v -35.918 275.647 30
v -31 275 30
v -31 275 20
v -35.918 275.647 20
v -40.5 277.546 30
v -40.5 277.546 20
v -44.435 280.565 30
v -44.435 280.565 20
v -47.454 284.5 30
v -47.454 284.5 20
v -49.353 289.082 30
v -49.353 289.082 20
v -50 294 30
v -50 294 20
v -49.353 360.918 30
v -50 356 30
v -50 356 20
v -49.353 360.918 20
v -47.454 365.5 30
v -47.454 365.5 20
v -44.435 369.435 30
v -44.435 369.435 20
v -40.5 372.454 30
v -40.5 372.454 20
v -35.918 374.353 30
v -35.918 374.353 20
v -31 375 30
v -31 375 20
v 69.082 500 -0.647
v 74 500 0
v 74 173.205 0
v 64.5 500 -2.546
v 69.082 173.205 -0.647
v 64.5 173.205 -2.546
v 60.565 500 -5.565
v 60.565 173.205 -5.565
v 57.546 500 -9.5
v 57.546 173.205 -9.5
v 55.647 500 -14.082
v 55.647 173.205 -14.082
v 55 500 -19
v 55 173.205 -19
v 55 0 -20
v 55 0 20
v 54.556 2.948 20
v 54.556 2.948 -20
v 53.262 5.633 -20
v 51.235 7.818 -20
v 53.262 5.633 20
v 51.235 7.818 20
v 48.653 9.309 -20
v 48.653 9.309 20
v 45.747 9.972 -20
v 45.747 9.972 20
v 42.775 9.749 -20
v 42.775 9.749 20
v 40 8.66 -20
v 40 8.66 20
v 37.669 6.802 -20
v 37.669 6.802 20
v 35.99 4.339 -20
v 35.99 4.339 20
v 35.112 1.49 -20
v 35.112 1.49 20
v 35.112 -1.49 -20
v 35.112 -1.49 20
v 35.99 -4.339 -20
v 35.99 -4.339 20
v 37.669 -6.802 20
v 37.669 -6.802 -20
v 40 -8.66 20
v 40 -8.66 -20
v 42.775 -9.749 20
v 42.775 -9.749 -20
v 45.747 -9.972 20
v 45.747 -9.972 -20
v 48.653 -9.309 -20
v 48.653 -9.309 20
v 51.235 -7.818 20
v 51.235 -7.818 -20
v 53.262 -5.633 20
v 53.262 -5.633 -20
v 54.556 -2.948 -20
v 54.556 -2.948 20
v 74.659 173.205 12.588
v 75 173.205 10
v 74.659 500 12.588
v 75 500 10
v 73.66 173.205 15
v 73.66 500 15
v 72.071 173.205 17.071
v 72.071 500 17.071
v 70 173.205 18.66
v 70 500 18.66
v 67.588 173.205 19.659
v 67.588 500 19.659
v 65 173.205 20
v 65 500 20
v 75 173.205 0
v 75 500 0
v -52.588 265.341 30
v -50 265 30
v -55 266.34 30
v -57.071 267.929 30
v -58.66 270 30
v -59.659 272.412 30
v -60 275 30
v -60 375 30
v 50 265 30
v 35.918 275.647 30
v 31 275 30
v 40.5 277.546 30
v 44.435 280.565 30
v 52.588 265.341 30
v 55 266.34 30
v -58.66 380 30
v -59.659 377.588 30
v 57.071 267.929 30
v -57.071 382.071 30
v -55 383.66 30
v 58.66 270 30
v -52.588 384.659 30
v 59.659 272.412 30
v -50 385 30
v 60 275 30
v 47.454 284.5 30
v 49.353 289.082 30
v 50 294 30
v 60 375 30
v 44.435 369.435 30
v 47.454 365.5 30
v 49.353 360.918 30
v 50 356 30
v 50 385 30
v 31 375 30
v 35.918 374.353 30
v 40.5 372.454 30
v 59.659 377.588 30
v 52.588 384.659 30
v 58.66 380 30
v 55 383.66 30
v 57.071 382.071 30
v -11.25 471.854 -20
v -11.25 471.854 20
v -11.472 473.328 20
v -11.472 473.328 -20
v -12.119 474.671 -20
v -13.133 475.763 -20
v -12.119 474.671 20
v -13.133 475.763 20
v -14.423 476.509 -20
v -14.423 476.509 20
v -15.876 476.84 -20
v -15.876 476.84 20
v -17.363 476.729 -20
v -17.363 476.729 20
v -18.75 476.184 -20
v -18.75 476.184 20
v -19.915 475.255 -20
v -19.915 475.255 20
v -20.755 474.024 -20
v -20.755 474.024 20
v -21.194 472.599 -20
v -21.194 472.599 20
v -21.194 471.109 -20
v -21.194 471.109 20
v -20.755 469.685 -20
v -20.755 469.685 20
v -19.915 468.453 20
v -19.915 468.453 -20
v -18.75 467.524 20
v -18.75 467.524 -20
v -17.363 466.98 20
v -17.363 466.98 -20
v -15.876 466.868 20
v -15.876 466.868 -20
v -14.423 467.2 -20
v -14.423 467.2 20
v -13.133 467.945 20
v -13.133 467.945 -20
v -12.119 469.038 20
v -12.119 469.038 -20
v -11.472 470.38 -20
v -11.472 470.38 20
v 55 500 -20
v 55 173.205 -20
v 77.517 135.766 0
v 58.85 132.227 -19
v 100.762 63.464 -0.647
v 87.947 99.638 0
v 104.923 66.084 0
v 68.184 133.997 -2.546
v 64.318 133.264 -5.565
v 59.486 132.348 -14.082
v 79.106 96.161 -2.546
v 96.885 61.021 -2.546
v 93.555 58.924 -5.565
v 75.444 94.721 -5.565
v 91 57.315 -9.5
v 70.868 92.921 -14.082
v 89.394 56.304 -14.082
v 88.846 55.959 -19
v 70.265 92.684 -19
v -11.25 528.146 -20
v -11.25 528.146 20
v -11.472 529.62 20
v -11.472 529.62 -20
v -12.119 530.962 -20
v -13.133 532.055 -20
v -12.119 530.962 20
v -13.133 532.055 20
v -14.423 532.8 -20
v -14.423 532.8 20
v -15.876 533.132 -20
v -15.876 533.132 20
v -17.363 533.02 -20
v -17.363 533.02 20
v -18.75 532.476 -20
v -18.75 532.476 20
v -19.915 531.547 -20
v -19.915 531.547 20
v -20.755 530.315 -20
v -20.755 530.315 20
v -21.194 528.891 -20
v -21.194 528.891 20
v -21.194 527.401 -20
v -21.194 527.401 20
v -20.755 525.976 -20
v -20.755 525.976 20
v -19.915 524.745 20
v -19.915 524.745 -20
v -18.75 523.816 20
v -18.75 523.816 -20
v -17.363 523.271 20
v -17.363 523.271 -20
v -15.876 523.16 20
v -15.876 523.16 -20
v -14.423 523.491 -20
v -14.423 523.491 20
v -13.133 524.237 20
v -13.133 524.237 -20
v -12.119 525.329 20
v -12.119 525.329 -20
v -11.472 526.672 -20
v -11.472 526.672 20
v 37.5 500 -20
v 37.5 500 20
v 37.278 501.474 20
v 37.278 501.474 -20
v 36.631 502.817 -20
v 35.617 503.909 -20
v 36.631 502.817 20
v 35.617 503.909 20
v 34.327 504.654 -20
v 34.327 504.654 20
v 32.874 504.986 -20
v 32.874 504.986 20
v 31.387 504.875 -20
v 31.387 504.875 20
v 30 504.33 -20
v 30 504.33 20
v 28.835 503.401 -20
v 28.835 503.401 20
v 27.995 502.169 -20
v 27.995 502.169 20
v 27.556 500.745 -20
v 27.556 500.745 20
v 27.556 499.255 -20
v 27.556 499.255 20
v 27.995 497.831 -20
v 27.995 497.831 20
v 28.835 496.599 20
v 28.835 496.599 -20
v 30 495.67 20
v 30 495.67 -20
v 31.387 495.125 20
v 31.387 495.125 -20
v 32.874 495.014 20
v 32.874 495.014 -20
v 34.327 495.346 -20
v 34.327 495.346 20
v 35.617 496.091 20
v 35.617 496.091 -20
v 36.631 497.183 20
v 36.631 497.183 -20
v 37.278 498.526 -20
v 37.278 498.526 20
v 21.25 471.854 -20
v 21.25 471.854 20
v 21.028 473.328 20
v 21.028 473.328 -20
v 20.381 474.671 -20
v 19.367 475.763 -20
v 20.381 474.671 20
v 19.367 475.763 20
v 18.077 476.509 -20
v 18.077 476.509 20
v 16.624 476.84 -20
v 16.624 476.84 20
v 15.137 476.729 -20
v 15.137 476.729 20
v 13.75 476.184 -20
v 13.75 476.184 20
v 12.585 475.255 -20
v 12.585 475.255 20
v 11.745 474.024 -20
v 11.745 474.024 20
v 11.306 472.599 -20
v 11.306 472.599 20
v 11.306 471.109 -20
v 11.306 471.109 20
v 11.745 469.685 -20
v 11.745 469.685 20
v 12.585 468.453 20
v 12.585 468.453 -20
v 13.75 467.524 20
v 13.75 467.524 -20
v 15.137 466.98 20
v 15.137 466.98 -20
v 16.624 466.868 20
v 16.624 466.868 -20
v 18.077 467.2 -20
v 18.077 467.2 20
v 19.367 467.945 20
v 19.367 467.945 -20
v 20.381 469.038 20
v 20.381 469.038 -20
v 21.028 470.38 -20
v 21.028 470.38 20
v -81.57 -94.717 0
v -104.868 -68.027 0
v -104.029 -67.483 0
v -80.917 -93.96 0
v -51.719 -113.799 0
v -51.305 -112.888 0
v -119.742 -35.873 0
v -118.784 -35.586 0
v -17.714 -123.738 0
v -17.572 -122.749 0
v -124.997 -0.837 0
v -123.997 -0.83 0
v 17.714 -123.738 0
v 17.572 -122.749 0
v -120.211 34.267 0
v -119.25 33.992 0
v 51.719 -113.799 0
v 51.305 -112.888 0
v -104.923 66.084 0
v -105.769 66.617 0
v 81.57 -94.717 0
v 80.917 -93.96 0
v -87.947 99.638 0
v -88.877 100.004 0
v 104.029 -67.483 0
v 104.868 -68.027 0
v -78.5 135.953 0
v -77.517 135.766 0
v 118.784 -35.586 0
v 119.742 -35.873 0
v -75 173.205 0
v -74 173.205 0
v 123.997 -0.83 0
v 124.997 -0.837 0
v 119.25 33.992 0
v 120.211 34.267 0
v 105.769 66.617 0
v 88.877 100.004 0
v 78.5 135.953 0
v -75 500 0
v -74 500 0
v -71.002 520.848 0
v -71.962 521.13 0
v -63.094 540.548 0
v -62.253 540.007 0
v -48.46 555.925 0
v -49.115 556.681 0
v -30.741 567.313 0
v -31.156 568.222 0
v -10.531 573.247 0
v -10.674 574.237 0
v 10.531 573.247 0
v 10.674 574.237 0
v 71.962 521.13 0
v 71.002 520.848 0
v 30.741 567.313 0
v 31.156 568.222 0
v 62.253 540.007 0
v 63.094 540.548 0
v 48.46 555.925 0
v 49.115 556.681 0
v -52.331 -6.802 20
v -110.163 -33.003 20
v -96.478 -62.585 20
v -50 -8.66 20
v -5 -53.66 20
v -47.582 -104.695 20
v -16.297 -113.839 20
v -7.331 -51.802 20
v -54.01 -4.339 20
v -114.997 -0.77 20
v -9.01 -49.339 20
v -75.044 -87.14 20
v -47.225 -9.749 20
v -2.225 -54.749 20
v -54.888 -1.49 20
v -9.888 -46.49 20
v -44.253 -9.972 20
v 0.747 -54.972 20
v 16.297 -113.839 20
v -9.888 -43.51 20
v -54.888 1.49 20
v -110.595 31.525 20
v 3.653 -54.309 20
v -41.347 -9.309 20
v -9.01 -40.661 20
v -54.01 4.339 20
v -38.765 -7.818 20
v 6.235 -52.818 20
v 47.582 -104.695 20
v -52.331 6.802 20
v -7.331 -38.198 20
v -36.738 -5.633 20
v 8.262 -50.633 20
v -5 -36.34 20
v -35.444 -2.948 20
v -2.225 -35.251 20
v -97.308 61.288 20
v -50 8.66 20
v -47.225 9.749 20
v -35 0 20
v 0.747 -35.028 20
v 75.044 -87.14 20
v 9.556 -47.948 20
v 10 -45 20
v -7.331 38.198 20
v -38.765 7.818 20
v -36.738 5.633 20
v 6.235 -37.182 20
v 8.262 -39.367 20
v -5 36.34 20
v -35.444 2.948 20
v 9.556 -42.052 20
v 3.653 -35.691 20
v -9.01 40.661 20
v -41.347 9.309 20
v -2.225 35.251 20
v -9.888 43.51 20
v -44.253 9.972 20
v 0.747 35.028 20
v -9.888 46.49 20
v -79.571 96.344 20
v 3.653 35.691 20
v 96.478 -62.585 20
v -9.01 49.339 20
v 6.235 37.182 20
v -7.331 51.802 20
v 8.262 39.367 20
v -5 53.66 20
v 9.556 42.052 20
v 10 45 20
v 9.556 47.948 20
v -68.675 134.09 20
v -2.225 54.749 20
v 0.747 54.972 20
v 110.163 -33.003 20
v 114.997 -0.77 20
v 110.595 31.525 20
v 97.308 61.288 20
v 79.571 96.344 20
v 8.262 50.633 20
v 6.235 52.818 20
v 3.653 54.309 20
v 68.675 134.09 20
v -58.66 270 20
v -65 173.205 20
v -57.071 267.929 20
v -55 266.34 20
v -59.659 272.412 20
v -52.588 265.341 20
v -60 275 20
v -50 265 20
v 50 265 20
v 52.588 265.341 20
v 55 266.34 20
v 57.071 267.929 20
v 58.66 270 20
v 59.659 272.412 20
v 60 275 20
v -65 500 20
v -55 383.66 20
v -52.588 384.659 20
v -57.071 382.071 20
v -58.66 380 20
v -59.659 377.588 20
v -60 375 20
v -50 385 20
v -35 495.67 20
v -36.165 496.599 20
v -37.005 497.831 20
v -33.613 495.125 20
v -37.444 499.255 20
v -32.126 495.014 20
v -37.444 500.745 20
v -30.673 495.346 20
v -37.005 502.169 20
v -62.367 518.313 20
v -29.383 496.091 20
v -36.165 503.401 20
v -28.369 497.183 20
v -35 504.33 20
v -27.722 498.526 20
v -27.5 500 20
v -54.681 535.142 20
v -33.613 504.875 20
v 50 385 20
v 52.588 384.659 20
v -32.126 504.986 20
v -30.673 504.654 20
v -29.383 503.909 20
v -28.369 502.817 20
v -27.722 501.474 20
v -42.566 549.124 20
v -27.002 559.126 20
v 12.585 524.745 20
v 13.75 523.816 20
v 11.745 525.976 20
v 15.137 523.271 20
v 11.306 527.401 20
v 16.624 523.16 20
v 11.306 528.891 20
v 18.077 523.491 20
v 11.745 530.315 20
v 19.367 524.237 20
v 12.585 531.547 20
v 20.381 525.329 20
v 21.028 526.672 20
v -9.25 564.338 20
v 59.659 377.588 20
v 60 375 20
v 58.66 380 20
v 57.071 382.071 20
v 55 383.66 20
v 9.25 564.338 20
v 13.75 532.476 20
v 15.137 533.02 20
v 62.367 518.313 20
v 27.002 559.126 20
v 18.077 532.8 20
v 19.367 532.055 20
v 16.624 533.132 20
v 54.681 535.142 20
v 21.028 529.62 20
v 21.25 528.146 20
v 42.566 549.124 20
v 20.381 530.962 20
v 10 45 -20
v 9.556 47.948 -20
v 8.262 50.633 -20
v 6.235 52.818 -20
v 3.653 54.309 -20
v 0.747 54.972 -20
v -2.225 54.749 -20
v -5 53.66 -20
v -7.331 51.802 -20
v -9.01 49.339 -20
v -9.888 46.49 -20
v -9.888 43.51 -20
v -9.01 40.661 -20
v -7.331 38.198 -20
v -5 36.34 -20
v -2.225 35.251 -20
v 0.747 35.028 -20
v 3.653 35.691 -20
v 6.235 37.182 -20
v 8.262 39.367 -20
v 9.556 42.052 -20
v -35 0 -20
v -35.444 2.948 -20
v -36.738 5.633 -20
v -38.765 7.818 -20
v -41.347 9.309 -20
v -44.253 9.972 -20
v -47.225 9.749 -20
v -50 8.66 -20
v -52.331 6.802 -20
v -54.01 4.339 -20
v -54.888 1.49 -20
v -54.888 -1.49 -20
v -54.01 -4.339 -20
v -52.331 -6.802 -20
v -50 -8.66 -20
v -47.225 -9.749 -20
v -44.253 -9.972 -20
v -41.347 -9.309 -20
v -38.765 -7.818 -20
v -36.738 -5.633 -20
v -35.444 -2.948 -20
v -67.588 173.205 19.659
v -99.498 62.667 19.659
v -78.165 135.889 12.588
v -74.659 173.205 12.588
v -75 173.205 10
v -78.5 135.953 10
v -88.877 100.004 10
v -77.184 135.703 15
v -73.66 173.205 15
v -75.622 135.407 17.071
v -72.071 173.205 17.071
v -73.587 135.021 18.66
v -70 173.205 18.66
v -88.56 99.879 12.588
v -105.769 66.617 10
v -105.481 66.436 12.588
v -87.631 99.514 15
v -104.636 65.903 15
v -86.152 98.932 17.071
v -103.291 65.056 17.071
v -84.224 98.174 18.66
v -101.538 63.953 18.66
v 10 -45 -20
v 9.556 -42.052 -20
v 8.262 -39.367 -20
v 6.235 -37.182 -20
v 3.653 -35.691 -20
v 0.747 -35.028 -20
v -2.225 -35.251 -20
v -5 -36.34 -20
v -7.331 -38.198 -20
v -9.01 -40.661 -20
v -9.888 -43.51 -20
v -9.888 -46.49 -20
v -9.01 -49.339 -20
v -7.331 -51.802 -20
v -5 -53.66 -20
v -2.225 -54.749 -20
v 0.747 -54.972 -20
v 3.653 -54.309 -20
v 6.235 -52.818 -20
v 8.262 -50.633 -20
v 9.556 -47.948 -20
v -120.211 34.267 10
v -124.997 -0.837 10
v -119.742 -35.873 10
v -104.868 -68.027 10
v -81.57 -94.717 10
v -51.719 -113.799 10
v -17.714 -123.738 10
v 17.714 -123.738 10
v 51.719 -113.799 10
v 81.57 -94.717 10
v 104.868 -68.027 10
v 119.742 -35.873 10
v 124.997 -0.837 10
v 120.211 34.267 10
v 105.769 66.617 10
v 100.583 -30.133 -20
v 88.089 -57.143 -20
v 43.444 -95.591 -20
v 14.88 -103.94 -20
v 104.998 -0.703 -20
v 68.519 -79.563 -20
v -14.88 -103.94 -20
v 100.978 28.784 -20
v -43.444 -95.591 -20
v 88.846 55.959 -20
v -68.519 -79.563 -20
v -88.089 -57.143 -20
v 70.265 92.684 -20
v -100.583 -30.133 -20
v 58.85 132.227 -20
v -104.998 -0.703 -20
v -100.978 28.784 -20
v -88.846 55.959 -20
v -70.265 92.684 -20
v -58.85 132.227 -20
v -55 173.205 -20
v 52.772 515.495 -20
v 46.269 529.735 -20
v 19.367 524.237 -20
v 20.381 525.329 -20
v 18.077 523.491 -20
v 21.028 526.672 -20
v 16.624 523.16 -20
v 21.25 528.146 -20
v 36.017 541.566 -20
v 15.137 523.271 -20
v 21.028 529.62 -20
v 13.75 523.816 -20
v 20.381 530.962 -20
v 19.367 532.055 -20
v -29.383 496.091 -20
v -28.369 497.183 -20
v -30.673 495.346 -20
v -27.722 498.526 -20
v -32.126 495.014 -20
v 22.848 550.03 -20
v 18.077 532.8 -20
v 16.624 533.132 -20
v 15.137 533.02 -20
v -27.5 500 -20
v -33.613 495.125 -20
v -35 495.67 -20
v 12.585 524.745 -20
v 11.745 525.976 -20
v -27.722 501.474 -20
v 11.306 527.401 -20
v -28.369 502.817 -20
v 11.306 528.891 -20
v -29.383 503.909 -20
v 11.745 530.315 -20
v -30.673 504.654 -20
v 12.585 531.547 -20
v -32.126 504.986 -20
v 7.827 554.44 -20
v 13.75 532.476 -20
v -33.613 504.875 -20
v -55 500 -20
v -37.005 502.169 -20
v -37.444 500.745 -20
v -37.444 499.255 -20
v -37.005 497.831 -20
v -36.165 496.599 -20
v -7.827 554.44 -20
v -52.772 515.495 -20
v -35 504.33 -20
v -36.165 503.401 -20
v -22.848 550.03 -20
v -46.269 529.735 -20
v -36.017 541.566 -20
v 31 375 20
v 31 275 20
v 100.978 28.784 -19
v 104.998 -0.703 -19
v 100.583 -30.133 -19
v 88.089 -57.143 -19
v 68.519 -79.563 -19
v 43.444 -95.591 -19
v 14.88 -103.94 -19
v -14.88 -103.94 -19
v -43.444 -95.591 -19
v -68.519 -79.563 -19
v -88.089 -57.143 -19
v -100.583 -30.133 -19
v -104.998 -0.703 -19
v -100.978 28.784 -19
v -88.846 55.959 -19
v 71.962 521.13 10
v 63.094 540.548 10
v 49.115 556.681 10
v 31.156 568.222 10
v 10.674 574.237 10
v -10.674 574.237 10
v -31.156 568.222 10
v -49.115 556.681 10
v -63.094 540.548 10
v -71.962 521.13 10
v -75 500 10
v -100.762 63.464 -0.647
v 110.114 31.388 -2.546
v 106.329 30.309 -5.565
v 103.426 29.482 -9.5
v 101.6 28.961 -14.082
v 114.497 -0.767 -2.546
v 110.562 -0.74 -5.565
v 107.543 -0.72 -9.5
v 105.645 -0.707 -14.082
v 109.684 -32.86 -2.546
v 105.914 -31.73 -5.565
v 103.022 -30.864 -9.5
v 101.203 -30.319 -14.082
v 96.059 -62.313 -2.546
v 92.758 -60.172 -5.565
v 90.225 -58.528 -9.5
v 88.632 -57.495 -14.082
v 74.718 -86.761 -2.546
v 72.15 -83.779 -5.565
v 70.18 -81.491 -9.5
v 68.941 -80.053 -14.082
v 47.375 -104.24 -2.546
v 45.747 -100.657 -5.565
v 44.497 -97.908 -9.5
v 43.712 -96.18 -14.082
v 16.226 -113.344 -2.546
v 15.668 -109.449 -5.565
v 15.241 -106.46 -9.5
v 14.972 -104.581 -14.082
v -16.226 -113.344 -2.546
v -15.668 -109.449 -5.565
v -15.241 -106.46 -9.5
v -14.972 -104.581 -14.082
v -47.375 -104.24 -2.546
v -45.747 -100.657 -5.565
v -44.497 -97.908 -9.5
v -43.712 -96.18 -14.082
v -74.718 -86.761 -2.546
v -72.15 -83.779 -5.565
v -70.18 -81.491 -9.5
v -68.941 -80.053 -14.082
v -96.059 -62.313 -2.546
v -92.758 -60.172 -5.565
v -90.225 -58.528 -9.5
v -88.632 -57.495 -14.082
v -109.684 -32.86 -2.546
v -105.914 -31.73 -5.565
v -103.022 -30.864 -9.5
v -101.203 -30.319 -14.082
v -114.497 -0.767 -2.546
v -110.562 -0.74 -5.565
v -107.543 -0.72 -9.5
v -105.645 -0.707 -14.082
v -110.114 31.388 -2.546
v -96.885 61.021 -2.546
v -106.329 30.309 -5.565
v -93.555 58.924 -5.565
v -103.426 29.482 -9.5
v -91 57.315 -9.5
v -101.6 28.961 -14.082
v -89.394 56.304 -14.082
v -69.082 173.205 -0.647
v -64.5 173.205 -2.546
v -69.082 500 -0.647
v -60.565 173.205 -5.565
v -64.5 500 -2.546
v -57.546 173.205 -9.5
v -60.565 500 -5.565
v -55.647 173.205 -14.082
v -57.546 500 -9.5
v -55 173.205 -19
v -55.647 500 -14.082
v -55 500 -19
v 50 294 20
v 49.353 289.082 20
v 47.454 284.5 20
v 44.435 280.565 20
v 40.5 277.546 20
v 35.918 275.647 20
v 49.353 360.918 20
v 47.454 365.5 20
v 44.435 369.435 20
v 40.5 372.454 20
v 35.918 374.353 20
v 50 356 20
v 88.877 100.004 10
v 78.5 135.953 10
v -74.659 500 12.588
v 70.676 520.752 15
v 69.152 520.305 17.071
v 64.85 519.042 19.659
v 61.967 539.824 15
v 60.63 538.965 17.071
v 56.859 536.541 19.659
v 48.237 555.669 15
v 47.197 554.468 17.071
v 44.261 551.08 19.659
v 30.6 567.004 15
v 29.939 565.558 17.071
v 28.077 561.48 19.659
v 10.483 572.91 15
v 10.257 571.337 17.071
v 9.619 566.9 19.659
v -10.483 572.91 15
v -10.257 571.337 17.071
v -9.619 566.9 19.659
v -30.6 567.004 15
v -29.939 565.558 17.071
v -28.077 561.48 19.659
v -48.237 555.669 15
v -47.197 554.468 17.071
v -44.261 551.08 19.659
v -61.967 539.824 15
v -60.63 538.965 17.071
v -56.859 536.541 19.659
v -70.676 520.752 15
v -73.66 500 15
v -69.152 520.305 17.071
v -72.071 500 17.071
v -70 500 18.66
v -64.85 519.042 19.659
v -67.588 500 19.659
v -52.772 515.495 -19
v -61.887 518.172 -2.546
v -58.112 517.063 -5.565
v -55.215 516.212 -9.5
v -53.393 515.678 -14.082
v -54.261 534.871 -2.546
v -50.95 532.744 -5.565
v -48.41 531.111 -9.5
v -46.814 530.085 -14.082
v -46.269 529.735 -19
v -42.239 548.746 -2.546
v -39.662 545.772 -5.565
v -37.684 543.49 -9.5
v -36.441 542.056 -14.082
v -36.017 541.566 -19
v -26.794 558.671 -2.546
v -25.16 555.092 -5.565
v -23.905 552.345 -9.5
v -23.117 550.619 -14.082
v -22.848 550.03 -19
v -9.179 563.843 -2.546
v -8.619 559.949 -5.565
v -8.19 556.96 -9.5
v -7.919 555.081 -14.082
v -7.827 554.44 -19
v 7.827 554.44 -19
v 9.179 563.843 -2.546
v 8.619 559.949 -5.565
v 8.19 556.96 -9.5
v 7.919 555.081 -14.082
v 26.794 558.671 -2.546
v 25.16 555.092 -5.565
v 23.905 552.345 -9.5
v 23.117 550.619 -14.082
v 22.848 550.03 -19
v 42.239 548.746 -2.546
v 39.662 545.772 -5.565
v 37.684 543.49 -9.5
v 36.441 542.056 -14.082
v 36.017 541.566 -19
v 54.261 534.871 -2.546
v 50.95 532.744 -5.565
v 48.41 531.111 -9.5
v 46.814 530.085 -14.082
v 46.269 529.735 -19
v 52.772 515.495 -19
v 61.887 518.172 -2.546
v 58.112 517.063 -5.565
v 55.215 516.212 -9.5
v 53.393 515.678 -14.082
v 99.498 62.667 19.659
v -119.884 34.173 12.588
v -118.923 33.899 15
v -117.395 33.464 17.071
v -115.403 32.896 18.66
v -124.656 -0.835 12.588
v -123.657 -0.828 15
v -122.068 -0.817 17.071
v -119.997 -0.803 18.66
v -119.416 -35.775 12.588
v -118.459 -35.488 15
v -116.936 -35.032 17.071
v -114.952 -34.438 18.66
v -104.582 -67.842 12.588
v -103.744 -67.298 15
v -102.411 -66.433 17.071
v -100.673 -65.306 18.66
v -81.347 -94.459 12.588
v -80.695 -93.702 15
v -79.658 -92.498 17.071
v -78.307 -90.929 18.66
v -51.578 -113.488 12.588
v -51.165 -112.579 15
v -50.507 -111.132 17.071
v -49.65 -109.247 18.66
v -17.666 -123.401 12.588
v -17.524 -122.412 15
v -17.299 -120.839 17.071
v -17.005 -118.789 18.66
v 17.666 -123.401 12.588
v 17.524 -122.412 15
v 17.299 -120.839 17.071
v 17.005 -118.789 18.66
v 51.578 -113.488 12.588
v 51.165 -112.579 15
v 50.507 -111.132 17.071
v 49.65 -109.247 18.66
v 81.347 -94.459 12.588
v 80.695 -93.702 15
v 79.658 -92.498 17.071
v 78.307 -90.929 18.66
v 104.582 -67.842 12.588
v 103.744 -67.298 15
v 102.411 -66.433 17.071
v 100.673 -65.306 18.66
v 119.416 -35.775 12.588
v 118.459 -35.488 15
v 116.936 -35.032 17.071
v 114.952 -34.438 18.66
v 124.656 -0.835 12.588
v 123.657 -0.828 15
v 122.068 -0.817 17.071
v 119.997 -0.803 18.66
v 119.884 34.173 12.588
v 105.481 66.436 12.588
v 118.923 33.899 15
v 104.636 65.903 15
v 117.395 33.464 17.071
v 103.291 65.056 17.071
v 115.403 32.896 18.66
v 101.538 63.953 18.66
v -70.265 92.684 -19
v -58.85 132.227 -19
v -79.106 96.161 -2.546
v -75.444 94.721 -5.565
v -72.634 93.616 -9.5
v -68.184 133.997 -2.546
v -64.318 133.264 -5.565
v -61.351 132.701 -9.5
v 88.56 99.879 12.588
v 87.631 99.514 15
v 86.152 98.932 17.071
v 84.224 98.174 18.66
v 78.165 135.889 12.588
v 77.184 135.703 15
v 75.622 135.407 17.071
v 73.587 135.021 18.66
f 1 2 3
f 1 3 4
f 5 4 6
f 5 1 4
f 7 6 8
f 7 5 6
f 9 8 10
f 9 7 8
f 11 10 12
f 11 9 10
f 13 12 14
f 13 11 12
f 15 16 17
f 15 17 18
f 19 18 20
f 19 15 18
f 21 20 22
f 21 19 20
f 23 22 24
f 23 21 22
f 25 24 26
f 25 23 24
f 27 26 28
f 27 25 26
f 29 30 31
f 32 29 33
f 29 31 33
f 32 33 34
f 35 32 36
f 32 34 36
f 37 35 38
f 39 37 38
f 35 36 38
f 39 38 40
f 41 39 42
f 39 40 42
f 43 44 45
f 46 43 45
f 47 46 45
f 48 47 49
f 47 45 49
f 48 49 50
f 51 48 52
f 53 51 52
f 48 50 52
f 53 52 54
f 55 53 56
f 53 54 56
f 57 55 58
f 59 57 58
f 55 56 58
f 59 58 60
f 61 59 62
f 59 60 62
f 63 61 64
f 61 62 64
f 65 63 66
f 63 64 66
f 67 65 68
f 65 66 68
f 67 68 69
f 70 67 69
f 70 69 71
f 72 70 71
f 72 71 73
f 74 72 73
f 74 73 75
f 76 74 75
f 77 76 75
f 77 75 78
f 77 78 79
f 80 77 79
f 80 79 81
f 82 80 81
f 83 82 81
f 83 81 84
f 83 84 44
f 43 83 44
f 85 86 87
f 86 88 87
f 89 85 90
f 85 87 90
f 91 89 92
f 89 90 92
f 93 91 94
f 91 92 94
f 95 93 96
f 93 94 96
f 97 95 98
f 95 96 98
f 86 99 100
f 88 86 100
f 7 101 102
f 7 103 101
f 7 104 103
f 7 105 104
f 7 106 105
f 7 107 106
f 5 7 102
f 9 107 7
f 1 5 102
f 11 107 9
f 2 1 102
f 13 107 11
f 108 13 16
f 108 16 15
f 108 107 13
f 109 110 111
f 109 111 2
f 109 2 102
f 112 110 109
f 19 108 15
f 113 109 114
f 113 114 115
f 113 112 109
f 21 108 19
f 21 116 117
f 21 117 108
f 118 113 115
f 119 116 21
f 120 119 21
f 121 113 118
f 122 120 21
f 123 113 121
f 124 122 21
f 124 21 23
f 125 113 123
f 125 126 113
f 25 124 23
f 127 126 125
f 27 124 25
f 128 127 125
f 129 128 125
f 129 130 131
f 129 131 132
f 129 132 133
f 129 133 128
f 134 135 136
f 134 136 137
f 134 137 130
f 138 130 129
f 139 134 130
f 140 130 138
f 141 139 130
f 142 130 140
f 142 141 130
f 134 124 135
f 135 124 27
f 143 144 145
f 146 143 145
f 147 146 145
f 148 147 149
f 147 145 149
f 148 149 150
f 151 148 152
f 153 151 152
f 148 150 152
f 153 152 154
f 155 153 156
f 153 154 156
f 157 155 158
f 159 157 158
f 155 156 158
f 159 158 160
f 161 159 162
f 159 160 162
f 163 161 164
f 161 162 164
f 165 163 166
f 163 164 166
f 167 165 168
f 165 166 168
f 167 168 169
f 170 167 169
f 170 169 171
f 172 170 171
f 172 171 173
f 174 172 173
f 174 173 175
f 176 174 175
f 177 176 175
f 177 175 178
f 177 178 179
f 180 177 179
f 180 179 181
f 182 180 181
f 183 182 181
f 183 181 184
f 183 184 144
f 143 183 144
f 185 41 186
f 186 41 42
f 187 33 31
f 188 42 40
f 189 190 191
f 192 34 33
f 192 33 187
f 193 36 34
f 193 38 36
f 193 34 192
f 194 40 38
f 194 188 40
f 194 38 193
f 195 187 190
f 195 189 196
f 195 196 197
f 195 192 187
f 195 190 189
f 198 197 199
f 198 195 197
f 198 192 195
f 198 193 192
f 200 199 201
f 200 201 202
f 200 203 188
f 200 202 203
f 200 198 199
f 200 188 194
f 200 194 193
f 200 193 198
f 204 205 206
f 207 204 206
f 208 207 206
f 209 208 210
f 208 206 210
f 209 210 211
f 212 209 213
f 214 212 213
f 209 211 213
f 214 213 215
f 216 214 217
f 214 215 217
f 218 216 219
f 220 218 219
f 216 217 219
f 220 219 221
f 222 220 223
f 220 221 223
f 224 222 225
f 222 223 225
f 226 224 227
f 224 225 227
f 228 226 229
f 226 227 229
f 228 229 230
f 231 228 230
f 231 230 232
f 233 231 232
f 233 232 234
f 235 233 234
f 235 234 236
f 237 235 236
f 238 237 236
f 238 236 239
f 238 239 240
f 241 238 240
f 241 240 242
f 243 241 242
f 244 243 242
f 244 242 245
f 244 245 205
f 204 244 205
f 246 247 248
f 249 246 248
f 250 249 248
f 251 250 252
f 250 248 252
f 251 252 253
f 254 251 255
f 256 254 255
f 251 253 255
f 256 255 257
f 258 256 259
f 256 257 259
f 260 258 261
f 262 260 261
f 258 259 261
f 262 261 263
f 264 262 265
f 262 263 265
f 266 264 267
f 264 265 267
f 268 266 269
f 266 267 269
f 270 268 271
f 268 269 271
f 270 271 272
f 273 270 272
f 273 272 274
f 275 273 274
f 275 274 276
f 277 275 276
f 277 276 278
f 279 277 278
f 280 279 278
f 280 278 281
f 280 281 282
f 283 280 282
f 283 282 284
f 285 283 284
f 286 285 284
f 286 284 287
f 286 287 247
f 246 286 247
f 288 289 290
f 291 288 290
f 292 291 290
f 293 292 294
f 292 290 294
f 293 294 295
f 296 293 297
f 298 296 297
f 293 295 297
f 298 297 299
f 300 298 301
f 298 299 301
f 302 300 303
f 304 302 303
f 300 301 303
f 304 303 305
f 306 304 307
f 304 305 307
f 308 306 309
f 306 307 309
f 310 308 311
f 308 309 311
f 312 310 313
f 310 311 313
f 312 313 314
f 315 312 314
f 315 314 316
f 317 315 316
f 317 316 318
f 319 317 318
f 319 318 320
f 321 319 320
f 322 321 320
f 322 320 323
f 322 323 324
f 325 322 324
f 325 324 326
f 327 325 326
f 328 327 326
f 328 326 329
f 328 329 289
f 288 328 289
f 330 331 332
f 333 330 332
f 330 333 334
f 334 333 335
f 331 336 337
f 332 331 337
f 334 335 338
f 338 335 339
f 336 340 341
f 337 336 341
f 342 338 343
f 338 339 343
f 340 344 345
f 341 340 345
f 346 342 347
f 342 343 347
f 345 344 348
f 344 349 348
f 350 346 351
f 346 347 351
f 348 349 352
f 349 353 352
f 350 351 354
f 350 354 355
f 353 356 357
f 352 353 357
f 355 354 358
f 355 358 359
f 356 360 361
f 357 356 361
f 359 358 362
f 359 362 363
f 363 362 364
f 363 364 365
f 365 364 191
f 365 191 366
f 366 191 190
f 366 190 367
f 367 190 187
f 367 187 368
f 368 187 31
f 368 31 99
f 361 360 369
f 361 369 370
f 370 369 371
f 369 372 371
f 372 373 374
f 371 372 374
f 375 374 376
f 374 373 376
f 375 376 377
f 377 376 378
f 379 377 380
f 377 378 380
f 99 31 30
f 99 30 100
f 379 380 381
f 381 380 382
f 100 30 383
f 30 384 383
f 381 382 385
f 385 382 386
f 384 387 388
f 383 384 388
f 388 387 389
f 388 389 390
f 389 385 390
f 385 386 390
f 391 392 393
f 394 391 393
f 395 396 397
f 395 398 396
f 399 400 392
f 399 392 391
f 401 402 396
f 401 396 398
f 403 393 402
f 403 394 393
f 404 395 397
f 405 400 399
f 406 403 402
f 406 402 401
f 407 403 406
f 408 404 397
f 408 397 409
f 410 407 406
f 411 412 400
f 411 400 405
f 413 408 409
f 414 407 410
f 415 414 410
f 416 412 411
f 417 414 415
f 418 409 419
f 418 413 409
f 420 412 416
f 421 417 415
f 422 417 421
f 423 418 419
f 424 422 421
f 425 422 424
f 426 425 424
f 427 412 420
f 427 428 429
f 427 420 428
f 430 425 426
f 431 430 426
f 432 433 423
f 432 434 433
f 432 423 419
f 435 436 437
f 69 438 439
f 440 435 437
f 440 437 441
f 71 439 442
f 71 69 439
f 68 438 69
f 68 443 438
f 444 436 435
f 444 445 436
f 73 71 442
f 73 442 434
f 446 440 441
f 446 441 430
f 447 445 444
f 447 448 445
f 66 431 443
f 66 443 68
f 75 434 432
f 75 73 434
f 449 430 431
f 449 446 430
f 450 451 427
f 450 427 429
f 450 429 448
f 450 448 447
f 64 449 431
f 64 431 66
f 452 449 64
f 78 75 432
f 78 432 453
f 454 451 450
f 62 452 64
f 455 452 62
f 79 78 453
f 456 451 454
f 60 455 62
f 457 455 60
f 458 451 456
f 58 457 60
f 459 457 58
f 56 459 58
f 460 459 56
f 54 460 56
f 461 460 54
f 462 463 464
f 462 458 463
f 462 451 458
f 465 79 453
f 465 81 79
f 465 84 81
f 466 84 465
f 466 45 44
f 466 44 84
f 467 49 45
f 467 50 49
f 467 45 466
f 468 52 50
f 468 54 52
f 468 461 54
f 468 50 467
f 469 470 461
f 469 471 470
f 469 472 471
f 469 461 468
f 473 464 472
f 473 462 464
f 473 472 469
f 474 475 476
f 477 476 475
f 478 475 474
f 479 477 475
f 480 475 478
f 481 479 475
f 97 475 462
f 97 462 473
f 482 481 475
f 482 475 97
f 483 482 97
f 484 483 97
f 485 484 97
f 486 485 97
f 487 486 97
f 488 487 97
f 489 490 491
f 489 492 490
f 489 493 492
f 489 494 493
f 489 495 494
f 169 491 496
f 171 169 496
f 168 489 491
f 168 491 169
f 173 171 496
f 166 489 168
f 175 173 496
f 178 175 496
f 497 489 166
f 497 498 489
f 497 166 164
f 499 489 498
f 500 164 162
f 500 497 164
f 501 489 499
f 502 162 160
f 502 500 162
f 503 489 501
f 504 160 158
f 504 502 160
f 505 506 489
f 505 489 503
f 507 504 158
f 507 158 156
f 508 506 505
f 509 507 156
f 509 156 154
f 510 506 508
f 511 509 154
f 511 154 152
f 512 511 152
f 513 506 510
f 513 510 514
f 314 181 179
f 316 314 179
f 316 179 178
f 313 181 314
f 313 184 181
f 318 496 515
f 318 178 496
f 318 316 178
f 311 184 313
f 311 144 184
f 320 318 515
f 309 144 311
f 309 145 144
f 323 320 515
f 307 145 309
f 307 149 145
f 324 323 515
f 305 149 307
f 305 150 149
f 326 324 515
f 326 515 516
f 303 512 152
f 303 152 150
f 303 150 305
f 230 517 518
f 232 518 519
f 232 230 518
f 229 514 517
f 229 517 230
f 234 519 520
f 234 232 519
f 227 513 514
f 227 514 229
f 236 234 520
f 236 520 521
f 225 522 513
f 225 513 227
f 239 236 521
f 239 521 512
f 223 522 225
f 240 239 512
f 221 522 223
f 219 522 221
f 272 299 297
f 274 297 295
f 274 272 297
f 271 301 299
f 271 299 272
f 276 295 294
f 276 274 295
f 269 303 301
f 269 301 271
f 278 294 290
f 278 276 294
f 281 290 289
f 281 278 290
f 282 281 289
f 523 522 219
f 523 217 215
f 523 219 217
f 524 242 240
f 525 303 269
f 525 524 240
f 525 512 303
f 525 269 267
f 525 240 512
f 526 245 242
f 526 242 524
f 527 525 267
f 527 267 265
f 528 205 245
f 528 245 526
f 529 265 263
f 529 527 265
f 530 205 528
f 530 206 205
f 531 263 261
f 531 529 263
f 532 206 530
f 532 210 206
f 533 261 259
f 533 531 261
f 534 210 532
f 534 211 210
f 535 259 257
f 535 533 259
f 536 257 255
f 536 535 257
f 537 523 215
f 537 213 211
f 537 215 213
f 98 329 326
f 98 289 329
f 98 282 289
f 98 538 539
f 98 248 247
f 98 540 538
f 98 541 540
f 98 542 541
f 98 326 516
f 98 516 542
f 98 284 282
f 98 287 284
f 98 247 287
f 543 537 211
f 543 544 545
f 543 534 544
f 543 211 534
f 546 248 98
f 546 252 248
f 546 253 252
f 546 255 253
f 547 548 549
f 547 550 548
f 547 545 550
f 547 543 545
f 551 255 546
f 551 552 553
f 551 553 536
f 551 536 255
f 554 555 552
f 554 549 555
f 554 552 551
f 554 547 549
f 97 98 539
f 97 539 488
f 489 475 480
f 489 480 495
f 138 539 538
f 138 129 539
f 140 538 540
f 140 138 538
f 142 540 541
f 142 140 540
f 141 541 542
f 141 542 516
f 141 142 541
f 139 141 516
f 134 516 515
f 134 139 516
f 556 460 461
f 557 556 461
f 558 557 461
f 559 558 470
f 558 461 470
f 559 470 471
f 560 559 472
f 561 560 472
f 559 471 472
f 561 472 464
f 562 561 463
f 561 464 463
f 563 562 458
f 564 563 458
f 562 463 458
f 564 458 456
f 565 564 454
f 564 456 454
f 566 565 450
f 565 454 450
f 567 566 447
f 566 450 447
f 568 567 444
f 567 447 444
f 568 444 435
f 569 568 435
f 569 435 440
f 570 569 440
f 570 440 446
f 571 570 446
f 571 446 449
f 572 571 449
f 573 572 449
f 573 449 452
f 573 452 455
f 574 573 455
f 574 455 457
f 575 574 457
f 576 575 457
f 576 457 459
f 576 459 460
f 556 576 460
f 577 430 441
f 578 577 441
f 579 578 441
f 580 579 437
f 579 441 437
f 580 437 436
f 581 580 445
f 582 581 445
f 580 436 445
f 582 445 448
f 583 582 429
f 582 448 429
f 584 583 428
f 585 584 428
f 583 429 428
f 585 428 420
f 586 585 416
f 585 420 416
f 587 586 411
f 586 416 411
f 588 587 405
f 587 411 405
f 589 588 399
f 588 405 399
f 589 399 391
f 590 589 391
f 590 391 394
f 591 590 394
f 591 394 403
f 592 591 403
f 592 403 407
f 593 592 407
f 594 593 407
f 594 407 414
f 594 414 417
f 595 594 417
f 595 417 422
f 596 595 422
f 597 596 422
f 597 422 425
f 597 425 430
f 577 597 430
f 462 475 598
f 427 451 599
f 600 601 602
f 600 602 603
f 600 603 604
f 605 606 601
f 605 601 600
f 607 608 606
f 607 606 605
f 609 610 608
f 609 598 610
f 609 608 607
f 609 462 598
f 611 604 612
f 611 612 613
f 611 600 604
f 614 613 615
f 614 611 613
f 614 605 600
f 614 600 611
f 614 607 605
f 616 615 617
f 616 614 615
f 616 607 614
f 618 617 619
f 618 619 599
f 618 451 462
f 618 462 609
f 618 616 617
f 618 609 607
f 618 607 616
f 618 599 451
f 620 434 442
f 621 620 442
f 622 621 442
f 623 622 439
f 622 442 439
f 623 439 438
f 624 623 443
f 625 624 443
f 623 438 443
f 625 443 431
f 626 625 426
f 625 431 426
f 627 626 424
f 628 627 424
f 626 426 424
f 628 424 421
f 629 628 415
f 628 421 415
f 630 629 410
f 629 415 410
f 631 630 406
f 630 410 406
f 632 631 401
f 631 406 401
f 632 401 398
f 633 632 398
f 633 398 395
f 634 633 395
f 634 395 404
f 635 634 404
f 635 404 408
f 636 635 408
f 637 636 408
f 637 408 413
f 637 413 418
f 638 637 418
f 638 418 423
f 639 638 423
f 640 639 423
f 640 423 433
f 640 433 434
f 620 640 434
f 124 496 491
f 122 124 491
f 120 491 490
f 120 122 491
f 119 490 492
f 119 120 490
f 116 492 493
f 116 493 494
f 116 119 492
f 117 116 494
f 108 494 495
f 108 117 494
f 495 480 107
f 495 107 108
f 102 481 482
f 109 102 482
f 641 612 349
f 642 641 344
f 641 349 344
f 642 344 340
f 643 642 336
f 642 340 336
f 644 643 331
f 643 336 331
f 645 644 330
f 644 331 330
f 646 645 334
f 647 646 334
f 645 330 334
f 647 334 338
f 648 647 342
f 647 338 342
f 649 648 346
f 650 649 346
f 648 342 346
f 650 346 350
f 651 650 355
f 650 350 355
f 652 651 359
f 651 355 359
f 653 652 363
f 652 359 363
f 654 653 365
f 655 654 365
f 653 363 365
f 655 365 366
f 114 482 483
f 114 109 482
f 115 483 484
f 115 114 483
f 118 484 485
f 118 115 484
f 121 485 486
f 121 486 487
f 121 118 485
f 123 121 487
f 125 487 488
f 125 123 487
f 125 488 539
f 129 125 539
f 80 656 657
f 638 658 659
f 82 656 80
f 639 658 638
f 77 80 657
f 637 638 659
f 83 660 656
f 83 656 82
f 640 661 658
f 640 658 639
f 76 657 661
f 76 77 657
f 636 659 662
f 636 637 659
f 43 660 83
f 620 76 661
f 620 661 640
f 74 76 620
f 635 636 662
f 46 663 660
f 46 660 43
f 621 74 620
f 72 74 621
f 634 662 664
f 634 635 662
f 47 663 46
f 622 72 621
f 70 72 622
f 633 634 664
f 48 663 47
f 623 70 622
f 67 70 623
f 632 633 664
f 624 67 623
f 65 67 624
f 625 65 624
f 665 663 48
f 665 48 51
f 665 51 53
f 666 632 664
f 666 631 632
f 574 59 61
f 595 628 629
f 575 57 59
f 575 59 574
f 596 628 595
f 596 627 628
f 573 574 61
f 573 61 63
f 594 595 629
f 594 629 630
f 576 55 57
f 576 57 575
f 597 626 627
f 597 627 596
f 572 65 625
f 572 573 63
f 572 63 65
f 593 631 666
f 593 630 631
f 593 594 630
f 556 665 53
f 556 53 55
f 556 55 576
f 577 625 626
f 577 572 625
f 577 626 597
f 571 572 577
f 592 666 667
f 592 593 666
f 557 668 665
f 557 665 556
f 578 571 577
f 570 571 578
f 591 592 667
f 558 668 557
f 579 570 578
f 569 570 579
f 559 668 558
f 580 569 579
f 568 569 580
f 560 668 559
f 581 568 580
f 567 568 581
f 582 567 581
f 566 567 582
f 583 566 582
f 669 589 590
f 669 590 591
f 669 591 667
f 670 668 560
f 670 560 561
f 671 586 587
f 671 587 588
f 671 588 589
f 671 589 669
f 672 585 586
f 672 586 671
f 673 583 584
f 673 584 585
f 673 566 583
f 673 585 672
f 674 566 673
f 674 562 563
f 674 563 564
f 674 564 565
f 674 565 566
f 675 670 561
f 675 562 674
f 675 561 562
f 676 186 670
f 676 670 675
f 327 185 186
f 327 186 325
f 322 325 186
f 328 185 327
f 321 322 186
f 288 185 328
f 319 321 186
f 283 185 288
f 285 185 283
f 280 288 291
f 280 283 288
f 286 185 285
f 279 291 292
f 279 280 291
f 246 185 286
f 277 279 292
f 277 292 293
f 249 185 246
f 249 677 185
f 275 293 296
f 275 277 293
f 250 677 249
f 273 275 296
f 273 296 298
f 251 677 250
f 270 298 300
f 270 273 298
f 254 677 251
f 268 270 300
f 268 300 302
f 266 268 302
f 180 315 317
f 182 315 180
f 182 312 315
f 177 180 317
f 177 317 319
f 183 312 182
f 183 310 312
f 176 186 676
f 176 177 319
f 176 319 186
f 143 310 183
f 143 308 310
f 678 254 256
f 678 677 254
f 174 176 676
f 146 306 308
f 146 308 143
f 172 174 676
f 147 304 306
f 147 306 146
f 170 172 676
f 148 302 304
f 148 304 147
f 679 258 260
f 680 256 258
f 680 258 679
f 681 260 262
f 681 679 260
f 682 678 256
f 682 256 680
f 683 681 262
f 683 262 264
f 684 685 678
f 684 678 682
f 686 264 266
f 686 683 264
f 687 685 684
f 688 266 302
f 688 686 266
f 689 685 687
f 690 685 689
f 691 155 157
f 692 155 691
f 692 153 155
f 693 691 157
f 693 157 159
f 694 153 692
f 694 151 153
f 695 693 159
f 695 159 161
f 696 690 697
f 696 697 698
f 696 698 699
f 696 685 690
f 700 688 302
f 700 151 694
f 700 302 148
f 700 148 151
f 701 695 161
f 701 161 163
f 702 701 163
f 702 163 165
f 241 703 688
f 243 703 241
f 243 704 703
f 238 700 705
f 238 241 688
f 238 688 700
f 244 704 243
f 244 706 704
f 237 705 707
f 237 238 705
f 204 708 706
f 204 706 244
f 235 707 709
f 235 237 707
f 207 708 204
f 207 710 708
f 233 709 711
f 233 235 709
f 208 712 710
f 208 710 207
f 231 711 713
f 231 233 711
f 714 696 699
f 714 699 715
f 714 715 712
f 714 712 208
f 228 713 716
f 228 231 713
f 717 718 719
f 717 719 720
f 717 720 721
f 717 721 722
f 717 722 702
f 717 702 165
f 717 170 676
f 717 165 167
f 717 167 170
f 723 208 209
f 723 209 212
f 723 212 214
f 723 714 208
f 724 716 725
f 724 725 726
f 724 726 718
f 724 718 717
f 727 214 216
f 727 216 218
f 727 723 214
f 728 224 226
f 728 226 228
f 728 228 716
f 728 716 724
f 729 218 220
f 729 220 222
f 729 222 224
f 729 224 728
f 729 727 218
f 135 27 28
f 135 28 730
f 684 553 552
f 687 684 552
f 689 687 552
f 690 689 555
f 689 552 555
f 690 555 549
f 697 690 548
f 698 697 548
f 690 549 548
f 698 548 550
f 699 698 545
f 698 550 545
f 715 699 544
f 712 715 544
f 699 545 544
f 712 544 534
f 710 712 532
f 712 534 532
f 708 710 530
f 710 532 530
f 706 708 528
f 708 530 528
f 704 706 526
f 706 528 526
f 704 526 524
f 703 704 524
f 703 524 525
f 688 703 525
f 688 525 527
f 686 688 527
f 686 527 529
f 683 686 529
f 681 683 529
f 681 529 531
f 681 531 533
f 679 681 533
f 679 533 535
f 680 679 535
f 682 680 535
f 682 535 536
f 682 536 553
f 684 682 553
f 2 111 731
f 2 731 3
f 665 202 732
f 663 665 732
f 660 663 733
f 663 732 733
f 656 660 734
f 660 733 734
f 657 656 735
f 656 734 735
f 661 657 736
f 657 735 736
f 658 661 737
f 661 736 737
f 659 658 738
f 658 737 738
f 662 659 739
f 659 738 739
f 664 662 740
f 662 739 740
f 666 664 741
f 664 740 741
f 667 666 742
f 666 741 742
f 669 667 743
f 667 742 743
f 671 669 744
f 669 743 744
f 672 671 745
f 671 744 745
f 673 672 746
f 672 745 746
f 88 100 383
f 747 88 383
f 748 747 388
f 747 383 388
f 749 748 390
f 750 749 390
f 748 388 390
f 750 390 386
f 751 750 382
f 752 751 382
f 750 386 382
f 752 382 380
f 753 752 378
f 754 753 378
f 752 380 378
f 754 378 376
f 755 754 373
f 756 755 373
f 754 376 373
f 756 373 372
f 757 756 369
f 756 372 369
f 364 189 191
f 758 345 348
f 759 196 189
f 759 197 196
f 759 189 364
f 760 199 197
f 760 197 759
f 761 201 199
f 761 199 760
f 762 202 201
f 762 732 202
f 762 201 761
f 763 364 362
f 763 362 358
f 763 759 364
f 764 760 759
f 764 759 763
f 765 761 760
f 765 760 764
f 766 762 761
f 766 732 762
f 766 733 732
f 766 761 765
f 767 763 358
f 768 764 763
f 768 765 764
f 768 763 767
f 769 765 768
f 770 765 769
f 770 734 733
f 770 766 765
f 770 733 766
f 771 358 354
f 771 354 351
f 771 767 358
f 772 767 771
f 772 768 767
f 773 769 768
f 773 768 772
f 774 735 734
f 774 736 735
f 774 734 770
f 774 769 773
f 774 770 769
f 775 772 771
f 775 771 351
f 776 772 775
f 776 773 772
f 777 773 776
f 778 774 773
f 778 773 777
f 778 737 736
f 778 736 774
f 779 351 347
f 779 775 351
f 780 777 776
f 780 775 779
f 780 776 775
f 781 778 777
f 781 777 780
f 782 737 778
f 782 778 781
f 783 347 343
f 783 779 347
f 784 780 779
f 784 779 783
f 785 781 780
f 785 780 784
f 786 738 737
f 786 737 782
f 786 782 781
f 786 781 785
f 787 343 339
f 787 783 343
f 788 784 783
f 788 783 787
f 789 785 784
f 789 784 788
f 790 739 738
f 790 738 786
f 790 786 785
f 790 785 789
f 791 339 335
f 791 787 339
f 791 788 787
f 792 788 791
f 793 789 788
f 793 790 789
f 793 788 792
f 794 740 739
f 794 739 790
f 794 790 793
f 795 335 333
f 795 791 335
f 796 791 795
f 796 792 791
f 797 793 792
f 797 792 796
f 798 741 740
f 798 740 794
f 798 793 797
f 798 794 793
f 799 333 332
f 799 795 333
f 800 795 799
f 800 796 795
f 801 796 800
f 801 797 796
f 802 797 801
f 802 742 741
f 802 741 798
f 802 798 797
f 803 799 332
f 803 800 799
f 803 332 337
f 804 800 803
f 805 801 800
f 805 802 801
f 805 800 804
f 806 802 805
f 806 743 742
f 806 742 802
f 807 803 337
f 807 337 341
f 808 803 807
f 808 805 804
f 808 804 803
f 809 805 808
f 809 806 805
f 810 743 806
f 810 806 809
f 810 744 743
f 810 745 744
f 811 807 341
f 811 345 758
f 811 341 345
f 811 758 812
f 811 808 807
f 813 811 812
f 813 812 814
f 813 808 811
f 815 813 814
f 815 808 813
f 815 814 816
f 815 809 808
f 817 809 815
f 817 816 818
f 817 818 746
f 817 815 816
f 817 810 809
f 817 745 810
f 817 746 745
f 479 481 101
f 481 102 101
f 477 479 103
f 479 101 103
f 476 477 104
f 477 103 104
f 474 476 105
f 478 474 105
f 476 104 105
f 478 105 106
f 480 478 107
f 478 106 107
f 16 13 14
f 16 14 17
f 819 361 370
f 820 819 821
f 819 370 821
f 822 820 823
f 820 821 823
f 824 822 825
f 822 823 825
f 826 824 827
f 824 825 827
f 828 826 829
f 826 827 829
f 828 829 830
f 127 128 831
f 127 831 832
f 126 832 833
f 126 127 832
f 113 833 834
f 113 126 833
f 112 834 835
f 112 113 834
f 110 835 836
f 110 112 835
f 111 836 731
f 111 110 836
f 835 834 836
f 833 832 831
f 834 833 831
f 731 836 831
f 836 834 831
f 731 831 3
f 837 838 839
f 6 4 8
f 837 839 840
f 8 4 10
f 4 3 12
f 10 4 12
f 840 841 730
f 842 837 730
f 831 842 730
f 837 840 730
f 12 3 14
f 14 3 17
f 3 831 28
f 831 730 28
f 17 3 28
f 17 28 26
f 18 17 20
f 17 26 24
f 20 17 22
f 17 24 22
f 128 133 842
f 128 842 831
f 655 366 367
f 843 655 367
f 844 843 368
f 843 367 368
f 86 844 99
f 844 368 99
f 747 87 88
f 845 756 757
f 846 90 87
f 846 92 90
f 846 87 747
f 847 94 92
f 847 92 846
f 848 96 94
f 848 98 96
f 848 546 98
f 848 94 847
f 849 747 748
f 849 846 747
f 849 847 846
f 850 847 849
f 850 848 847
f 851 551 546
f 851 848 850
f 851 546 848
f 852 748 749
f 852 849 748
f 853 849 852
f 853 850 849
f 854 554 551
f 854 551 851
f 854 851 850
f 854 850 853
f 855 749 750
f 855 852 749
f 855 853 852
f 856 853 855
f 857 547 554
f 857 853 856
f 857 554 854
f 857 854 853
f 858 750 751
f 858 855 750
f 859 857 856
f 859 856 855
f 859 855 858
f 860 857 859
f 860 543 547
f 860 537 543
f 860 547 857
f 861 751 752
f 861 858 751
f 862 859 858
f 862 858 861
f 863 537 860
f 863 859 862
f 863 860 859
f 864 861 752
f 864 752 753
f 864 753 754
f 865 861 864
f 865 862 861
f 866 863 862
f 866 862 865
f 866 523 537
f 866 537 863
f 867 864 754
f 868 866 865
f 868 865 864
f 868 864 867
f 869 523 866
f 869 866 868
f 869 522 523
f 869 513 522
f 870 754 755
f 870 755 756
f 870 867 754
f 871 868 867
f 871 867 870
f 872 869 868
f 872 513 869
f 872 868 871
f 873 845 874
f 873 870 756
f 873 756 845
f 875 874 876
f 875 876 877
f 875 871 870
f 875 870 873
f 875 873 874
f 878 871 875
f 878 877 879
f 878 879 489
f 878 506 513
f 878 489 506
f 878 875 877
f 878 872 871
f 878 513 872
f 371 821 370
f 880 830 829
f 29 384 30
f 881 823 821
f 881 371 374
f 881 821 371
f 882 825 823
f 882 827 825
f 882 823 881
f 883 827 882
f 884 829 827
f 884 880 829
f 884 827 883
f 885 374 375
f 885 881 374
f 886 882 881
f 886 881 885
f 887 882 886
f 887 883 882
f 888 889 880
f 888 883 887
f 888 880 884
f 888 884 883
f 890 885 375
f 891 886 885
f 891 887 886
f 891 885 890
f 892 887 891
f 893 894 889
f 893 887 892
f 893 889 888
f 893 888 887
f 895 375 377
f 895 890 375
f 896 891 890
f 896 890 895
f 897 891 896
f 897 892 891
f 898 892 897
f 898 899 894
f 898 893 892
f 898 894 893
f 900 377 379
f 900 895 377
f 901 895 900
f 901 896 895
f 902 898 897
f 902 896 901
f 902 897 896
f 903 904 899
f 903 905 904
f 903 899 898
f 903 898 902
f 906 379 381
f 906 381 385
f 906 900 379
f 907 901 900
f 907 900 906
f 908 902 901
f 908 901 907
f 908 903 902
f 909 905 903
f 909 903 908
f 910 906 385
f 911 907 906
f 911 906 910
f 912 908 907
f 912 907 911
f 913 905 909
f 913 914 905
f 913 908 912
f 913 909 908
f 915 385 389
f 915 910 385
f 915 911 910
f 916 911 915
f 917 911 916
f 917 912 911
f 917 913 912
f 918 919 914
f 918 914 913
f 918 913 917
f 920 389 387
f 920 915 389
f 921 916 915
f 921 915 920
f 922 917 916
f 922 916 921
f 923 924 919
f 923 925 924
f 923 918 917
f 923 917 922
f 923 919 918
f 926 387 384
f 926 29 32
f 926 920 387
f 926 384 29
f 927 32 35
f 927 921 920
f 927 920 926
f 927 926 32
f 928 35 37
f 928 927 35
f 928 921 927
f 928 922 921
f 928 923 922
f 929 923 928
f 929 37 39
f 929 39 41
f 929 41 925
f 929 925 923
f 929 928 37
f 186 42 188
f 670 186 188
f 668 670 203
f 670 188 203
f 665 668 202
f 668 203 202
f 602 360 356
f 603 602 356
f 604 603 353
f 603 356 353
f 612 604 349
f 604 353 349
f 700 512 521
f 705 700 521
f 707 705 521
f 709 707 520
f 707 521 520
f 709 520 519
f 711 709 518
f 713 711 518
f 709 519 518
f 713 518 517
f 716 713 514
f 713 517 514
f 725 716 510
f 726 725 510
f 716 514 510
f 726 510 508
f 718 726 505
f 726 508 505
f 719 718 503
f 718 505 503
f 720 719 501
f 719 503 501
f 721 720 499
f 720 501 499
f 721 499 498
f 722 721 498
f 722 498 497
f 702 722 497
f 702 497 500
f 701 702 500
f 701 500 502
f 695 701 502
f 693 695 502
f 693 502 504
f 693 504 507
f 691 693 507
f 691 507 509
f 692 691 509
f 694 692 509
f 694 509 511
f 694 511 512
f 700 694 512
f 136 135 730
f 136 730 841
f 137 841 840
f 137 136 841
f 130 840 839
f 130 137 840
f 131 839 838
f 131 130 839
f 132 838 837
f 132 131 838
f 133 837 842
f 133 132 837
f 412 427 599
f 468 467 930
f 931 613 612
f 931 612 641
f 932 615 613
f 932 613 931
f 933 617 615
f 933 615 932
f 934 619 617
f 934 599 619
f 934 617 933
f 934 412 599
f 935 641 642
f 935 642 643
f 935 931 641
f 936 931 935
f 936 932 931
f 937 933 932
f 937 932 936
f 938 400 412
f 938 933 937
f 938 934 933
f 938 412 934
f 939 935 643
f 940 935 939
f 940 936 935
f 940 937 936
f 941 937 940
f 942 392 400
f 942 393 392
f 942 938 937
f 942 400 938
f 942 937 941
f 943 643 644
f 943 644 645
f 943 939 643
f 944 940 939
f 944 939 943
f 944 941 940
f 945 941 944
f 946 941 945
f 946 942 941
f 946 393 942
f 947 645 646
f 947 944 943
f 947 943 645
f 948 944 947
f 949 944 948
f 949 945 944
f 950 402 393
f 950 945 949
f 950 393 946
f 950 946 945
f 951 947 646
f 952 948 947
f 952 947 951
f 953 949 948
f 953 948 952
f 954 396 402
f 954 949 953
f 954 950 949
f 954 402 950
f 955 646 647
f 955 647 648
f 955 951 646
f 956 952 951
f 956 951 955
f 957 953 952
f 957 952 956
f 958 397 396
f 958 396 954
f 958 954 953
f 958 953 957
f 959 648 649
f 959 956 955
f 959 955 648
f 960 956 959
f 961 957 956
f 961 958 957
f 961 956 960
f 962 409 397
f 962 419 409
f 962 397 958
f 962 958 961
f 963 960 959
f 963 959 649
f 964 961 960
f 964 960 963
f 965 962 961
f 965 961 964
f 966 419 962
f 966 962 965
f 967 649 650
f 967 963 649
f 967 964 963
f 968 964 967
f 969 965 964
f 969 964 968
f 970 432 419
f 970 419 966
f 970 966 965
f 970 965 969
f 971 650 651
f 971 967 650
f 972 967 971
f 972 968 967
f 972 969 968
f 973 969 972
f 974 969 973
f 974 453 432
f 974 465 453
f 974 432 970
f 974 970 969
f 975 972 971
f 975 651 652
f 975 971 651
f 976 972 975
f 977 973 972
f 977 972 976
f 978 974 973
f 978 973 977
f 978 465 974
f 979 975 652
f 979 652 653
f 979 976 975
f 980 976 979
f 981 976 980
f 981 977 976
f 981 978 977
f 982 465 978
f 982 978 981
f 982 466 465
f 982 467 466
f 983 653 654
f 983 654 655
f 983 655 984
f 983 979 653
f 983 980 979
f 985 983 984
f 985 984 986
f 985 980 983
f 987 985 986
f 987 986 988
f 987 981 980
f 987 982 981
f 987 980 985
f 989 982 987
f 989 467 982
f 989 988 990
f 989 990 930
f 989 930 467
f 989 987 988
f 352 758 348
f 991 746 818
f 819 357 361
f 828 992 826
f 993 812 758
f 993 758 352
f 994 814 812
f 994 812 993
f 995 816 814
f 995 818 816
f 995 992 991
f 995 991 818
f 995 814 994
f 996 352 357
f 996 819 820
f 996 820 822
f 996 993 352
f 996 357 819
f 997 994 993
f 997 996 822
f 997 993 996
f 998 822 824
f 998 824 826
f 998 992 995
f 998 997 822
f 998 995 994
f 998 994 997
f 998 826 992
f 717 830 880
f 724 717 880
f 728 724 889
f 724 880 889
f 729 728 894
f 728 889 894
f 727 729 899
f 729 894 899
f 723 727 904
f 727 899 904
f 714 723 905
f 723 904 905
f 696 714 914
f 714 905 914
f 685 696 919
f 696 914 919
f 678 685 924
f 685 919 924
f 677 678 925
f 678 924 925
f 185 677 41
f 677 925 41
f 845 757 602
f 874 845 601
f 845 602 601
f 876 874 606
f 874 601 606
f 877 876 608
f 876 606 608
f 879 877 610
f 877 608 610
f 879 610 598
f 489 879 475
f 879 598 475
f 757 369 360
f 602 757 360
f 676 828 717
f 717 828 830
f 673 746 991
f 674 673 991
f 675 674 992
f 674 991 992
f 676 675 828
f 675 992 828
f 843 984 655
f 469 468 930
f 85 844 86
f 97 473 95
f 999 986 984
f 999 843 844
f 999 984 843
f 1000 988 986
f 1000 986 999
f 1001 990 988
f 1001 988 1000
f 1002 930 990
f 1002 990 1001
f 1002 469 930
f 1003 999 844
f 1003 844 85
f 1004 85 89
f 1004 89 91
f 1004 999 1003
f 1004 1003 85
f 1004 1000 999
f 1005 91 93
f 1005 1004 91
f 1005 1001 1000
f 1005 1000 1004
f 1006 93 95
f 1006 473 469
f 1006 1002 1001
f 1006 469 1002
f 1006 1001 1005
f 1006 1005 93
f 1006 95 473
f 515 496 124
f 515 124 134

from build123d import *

# Parameters (mm, degrees)
BOSS_EXTRUDE1_DEPTH = 20
BOSS_EXTRUDE2_DEPTH = 20
FILLET1_R           = 19
FILLET2_R           = 10
SKETCH3_R           = 5
SKETCH3_R_2         = 10
CUT_EXTRUDE1_DEPTH  = 590.788097561
SKETCH4_W           = 120
SKETCH4_H           = 120
BOSS_EXTRUDE3_DEPTH = 10
FILLET3_R           = 10
CUT_EXTRUDE2_DEPTH  = 10


with BuildPart() as part:
    # Sketch1 → Boss-Extrude1 (new body)
    with BuildSketch(Plane.XY):
        with BuildLine():
            Line((-75, 500), (-75, 173.205080757))
            ThreePointArc((-75, 173.205080757), (-82.846215434, 117.735061134), (-105.769230769, 66.617338753))
            ThreePointArc((-105.769230769, 66.617338753), (0, -125), (105.769230769, 66.617338753))
            ThreePointArc((105.769230769, 66.617338753), (82.846215434, 117.735061134), (75, 173.205080757))
            Line((75, 173.205080757), (75, 500))
            ThreePointArc((75, 500), (0, 575), (-75, 500))
        make_face()
    extrude(amount=BOSS_EXTRUDE1_DEPTH)

    # Sketch2 → Boss-Extrude2 (add)
    with BuildSketch(Plane(origin=(0, 0, 0), x_dir=(-1, 0, 0), z_dir=(0, 0, -1))):
        with BuildLine():
            Line((-55, 500), (-55, 173.205080757))
            ThreePointArc((-55, 173.205080757), (-63.630836977, 112.188059172), (-88.846153846, 55.958564552))
            ThreePointArc((-88.846153846, 55.958564552), (0, -105), (88.846153846, 55.958564552))
            ThreePointArc((88.846153846, 55.958564552), (63.630836977, 112.188059172), (55, 173.205080757))
            Line((55, 173.205080757), (55, 500))
            ThreePointArc((55, 500), (0, 555), (-55, 500))
        make_face()
    extrude(amount=BOSS_EXTRUDE2_DEPTH)

    # Fillet1
    fillet1_edges = [part.edges().sort_by_distance(p)[0] for p in [
        (0, 555, 0),
        (55, 336.602540378, 0),
        (63.630836977, 112.188059172, 0),
        (0, -105, 0),
        (-63.630836977, 112.188059172, 0),
        (-55, 336.602540378, 0),
    ]]
    fillet(fillet1_edges, radius=FILLET1_R)

    # Fillet2
    fillet2_edges = [part.edges().sort_by_distance(p)[0] for p in [
        (-82.846215434, 117.735061134, 20),
        (0, -125, 20),
        (82.846215434, 117.735061134, 20),
        (75, 336.602540378, 20),
        (0, 575, 20),
        (-75, 336.602540378, 20),
    ]]
    fillet(fillet2_edges, radius=FILLET2_R)

    # Sketch3 → Cut-Extrude1 (cut, through all)
    with BuildSketch(Plane.XY.offset(20)):
        with Locations((-32.5, 500)):
            Circle(SKETCH3_R)
        with Locations((-16.25, 528.145825623)):
            Circle(SKETCH3_R)
        with Locations((16.25, 528.145825623)):
            Circle(SKETCH3_R)
        with Locations((32.5, 500)):
            Circle(SKETCH3_R)
        with Locations((16.25, 471.854174377)):
            Circle(SKETCH3_R)
        with Locations((-16.25, 471.854174377)):
            Circle(SKETCH3_R)
        with Locations((-45, 0)):
            Circle(SKETCH3_R_2)
        with Locations((0, 45)):
            Circle(SKETCH3_R_2)
        with Locations((45, 0)):
            Circle(SKETCH3_R_2)
        with Locations((0, -45)):
            Circle(SKETCH3_R_2)
    extrude(amount=-CUT_EXTRUDE1_DEPTH, mode=Mode.SUBTRACT)

    # Sketch4 → Boss-Extrude3 (add)
    with BuildSketch(Plane.XY.offset(20)):
        with Locations((0, 325)):
            Rectangle(SKETCH4_W, SKETCH4_H)
    extrude(amount=BOSS_EXTRUDE3_DEPTH)

    # Fillet3
    fillet3_edges = [part.edges().sort_by_distance(p)[0] for p in [
        (60, 265, 25),
        (60, 385, 25),
        (-60, 385, 25),
        (-60, 265, 25),
    ]]
    fillet(fillet3_edges, radius=FILLET3_R)

    # Sketch5 → Cut-Extrude2 (cut)
    with BuildSketch(Plane.XY.offset(30)):
        with BuildLine():
            Line((31, 275), (-31, 275))
            ThreePointArc((-31, 275), (-44.435028843, 280.564971157), (-50, 294))
            Line((-50, 294), (-50, 356))
            ThreePointArc((-50, 356), (-44.435028843, 369.435028843), (-31, 375))
            Line((-31, 375), (31, 375))
            ThreePointArc((31, 375), (44.435028843, 369.435028843), (50, 356))
            Line((50, 356), (50, 294))
            ThreePointArc((50, 294), (44.435028843, 280.564971157), (31, 275))
        make_face()
    extrude(amount=-CUT_EXTRUDE2_DEPTH, mode=Mode.SUBTRACT)


solid = part.part
